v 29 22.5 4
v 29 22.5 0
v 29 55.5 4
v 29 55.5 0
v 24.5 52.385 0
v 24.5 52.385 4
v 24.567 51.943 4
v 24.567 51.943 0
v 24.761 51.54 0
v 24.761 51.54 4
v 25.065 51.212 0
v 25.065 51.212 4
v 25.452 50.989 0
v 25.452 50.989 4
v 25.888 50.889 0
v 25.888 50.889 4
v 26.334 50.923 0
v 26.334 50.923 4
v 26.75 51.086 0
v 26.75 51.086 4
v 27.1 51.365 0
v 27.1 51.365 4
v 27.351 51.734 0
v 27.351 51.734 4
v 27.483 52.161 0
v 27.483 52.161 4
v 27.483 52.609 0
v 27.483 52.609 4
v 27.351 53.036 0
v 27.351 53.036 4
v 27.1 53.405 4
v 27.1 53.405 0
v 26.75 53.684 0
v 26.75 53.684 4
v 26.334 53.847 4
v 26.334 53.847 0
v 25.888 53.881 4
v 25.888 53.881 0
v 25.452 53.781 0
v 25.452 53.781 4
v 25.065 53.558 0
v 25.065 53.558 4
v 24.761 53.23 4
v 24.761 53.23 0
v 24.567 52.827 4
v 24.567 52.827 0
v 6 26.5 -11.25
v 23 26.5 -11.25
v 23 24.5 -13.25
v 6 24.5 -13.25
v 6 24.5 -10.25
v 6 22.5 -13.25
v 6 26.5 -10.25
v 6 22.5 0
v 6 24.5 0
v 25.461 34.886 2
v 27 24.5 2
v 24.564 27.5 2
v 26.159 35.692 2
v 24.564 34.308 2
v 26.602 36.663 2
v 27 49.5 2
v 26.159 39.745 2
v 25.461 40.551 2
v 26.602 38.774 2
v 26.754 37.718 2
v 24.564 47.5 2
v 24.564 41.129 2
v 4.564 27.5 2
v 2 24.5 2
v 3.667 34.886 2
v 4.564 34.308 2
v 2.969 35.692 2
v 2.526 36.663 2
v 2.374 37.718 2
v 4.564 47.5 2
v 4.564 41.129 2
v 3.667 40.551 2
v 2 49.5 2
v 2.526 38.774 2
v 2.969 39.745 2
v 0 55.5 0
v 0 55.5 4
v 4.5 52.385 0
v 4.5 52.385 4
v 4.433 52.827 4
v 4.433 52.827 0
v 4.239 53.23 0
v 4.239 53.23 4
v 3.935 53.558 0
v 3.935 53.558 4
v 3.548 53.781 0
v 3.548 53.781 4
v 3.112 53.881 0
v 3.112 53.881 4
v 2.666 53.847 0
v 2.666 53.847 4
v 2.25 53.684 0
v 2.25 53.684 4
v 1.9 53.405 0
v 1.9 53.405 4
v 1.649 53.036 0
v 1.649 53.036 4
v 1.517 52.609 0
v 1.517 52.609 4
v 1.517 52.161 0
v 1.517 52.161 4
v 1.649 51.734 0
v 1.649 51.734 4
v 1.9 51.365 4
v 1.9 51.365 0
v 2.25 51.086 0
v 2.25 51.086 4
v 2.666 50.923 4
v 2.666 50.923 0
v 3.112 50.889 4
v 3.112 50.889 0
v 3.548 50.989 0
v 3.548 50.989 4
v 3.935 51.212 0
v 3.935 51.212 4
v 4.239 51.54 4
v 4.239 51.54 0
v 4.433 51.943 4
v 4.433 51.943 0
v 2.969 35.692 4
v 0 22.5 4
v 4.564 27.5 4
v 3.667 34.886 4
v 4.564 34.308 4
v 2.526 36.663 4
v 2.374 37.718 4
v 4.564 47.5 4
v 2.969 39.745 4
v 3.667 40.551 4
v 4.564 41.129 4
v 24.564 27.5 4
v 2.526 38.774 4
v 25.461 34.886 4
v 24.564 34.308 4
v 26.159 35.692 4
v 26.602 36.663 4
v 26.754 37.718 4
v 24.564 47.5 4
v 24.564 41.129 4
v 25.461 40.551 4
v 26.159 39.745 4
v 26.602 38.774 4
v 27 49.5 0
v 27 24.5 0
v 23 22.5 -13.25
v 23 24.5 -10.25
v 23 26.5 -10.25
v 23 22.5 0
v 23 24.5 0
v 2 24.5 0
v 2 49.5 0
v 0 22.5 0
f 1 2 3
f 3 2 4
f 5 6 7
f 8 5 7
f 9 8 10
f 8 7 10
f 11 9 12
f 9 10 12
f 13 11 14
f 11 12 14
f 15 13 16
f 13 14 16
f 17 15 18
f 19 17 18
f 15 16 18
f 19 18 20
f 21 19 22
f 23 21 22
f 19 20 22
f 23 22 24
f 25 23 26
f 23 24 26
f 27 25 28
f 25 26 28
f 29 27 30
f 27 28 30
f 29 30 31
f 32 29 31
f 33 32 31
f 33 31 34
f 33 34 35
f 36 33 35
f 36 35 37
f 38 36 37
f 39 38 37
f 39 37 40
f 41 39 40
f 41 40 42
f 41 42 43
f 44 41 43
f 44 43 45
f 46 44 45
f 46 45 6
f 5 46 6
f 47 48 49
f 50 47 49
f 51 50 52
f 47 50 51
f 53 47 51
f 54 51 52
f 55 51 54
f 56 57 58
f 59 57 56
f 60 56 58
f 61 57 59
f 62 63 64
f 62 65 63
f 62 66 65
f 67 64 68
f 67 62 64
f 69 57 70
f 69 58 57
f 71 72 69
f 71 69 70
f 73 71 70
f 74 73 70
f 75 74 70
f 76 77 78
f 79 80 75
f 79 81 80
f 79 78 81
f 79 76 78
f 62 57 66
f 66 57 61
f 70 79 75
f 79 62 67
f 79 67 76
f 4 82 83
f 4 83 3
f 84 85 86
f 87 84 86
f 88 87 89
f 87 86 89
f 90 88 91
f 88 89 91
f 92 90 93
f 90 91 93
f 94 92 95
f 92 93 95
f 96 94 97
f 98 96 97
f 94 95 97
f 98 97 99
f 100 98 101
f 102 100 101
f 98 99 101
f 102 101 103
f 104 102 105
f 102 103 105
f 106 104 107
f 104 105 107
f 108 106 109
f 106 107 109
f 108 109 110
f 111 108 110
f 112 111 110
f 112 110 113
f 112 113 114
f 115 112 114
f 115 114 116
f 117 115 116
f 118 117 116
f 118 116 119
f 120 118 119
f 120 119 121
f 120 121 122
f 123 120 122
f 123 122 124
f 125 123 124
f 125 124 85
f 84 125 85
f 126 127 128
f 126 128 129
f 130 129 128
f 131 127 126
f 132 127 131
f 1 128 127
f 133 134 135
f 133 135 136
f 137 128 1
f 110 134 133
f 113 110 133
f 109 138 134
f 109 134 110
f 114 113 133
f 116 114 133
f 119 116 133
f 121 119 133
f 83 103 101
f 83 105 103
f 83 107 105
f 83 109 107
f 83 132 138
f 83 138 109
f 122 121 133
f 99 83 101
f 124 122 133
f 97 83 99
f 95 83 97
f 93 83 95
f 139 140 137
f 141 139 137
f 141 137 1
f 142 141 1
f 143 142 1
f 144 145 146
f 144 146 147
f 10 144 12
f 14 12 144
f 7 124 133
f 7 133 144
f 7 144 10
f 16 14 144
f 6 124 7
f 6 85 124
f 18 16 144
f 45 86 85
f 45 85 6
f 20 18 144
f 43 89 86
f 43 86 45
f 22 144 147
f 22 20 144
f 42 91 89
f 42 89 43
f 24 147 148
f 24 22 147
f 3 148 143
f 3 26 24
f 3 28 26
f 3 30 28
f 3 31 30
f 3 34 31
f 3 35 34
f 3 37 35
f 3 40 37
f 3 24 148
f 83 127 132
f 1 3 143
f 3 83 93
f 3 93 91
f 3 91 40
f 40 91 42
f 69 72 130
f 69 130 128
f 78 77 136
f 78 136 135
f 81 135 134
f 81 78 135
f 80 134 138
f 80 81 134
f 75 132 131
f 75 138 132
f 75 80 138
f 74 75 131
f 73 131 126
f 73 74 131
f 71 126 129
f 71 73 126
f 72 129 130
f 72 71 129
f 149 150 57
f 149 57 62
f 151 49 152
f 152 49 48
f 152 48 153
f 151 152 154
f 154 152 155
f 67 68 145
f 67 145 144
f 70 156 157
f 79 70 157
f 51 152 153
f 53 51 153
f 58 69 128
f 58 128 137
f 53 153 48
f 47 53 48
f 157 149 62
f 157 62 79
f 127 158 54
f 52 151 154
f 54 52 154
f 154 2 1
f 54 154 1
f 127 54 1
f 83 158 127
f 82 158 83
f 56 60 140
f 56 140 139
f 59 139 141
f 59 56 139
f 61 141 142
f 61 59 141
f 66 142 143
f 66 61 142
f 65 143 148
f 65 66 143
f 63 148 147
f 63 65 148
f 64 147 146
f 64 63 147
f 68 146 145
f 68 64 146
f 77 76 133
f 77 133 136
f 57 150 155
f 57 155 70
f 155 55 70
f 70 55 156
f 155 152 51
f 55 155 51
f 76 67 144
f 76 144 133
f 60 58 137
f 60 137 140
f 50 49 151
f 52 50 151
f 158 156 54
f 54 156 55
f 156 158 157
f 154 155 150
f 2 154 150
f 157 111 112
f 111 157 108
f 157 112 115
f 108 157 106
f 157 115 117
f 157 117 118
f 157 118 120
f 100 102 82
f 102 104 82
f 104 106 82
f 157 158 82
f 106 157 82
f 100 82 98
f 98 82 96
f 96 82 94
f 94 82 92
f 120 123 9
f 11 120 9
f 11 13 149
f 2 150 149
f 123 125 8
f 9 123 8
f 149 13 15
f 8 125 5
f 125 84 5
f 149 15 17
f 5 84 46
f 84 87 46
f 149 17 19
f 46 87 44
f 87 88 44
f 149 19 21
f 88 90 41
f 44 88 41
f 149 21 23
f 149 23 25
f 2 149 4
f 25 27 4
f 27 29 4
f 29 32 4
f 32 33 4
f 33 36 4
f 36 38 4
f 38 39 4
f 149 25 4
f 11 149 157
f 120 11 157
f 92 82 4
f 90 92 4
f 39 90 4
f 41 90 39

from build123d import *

# Parameters (mm, degrees)
SKETCH1_W           = 29
SKETCH1_H           = 55.5
BODY_DEPTH          = 4
SKETCH2_R           = 1.5
BOLT_HOLES_DEPTH    = 63.747509911
CUT_EXTRUDE1_DEPTH  = 10
SKETCH6_W           = 25
SKETCH6_H           = 25
CUT_EXTRUDE2_DEPTH  = 2
SKETCH7_W           = 17
SKETCH7_H           = 2
BOSS_EXTRUDE1_DEPTH = 10.25
BOSS_EXTRUDE2_DEPTH = 17


with BuildPart() as part:
    # Sketch1 → Body (new body)
    with BuildSketch(Plane.XY):
        with Locations((14.5, 27.75)):
            Rectangle(SKETCH1_W, SKETCH1_H)
    extrude(amount=BODY_DEPTH)

    # Sketch2 → Bolt Holes (cut, through all)
    with BuildSketch(Plane.XY.offset(4)):
        with Locations((3, 52.385)):
            Circle(SKETCH2_R)
        with Locations(Location((26, 52.385, 0), (0, 0, 180))):
            Circle(SKETCH2_R)
        with Locations((26, 3.115)):
            Circle(SKETCH2_R)
        with Locations(Location((3, 3.115, 0), (0, 0, 180))):
            Circle(SKETCH2_R)
    extrude(amount=-BOLT_HOLES_DEPTH, mode=Mode.SUBTRACT)

    # Sketch4 → Cut-Extrude1 (cut)
    with BuildSketch(Plane.XY):
        with BuildLine():
            Line((4.563898139, 34.308305648), (4.563898139, 27.5))
            Line((4.563898139, 27.5), (24.563898139, 27.5))
            Line((24.563898139, 27.5), (24.563898139, 34.308305648))
            ThreePointArc((24.563898139, 34.308305648), (26.753898139, 37.718422948), (24.563898139, 41.128540248))
            Line((24.563898139, 41.128540248), (24.563898139, 47.5))
            Line((24.563898139, 47.5), (4.563898139, 47.5))
            Line((4.563898139, 47.5), (4.563898139, 41.128540248))
            ThreePointArc((4.563898139, 41.128540248), (2.373898139, 37.718422948), (4.563898139, 34.308305648))
        make_face()
    extrude(amount=CUT_EXTRUDE1_DEPTH, mode=Mode.SUBTRACT)

    # Sketch6 → Cut-Extrude2 (cut)
    with BuildSketch(Plane(origin=(0, 0, 0), x_dir=(-1, 0, 0), z_dir=(0, 0, -1))):
        with Locations((-14.5, 37)):
            Rectangle(SKETCH6_W, SKETCH6_H)
    extrude(amount=-CUT_EXTRUDE2_DEPTH, mode=Mode.SUBTRACT)

    # Sketch7 → Boss-Extrude1 (add)
    with BuildSketch(Plane.XY):
        with Locations((14.5, 23.5)):
            Rectangle(SKETCH7_W, SKETCH7_H)
    extrude(amount=-BOSS_EXTRUDE1_DEPTH)

    # Sketch8 → Boss-Extrude2 (add)
    with BuildSketch(Plane(origin=(23, 0, 0), x_dir=(0, 0, -1), z_dir=(1, 0, 0))):
        Polygon((10.25, 22.5), (10.25, 26.5), (11.25, 26.5), (13.25, 24.5), (13.25, 22.5), align=None)
    extrude(amount=-BOSS_EXTRUDE2_DEPTH)

    # SurfaceCut1
    split(bisect_by=Plane(origin=(0, 22.5, 0), x_dir=(-1, 0, 0), z_dir=(0, -1, 0)), keep=Keep.BOTTOM)


solid = part.part
